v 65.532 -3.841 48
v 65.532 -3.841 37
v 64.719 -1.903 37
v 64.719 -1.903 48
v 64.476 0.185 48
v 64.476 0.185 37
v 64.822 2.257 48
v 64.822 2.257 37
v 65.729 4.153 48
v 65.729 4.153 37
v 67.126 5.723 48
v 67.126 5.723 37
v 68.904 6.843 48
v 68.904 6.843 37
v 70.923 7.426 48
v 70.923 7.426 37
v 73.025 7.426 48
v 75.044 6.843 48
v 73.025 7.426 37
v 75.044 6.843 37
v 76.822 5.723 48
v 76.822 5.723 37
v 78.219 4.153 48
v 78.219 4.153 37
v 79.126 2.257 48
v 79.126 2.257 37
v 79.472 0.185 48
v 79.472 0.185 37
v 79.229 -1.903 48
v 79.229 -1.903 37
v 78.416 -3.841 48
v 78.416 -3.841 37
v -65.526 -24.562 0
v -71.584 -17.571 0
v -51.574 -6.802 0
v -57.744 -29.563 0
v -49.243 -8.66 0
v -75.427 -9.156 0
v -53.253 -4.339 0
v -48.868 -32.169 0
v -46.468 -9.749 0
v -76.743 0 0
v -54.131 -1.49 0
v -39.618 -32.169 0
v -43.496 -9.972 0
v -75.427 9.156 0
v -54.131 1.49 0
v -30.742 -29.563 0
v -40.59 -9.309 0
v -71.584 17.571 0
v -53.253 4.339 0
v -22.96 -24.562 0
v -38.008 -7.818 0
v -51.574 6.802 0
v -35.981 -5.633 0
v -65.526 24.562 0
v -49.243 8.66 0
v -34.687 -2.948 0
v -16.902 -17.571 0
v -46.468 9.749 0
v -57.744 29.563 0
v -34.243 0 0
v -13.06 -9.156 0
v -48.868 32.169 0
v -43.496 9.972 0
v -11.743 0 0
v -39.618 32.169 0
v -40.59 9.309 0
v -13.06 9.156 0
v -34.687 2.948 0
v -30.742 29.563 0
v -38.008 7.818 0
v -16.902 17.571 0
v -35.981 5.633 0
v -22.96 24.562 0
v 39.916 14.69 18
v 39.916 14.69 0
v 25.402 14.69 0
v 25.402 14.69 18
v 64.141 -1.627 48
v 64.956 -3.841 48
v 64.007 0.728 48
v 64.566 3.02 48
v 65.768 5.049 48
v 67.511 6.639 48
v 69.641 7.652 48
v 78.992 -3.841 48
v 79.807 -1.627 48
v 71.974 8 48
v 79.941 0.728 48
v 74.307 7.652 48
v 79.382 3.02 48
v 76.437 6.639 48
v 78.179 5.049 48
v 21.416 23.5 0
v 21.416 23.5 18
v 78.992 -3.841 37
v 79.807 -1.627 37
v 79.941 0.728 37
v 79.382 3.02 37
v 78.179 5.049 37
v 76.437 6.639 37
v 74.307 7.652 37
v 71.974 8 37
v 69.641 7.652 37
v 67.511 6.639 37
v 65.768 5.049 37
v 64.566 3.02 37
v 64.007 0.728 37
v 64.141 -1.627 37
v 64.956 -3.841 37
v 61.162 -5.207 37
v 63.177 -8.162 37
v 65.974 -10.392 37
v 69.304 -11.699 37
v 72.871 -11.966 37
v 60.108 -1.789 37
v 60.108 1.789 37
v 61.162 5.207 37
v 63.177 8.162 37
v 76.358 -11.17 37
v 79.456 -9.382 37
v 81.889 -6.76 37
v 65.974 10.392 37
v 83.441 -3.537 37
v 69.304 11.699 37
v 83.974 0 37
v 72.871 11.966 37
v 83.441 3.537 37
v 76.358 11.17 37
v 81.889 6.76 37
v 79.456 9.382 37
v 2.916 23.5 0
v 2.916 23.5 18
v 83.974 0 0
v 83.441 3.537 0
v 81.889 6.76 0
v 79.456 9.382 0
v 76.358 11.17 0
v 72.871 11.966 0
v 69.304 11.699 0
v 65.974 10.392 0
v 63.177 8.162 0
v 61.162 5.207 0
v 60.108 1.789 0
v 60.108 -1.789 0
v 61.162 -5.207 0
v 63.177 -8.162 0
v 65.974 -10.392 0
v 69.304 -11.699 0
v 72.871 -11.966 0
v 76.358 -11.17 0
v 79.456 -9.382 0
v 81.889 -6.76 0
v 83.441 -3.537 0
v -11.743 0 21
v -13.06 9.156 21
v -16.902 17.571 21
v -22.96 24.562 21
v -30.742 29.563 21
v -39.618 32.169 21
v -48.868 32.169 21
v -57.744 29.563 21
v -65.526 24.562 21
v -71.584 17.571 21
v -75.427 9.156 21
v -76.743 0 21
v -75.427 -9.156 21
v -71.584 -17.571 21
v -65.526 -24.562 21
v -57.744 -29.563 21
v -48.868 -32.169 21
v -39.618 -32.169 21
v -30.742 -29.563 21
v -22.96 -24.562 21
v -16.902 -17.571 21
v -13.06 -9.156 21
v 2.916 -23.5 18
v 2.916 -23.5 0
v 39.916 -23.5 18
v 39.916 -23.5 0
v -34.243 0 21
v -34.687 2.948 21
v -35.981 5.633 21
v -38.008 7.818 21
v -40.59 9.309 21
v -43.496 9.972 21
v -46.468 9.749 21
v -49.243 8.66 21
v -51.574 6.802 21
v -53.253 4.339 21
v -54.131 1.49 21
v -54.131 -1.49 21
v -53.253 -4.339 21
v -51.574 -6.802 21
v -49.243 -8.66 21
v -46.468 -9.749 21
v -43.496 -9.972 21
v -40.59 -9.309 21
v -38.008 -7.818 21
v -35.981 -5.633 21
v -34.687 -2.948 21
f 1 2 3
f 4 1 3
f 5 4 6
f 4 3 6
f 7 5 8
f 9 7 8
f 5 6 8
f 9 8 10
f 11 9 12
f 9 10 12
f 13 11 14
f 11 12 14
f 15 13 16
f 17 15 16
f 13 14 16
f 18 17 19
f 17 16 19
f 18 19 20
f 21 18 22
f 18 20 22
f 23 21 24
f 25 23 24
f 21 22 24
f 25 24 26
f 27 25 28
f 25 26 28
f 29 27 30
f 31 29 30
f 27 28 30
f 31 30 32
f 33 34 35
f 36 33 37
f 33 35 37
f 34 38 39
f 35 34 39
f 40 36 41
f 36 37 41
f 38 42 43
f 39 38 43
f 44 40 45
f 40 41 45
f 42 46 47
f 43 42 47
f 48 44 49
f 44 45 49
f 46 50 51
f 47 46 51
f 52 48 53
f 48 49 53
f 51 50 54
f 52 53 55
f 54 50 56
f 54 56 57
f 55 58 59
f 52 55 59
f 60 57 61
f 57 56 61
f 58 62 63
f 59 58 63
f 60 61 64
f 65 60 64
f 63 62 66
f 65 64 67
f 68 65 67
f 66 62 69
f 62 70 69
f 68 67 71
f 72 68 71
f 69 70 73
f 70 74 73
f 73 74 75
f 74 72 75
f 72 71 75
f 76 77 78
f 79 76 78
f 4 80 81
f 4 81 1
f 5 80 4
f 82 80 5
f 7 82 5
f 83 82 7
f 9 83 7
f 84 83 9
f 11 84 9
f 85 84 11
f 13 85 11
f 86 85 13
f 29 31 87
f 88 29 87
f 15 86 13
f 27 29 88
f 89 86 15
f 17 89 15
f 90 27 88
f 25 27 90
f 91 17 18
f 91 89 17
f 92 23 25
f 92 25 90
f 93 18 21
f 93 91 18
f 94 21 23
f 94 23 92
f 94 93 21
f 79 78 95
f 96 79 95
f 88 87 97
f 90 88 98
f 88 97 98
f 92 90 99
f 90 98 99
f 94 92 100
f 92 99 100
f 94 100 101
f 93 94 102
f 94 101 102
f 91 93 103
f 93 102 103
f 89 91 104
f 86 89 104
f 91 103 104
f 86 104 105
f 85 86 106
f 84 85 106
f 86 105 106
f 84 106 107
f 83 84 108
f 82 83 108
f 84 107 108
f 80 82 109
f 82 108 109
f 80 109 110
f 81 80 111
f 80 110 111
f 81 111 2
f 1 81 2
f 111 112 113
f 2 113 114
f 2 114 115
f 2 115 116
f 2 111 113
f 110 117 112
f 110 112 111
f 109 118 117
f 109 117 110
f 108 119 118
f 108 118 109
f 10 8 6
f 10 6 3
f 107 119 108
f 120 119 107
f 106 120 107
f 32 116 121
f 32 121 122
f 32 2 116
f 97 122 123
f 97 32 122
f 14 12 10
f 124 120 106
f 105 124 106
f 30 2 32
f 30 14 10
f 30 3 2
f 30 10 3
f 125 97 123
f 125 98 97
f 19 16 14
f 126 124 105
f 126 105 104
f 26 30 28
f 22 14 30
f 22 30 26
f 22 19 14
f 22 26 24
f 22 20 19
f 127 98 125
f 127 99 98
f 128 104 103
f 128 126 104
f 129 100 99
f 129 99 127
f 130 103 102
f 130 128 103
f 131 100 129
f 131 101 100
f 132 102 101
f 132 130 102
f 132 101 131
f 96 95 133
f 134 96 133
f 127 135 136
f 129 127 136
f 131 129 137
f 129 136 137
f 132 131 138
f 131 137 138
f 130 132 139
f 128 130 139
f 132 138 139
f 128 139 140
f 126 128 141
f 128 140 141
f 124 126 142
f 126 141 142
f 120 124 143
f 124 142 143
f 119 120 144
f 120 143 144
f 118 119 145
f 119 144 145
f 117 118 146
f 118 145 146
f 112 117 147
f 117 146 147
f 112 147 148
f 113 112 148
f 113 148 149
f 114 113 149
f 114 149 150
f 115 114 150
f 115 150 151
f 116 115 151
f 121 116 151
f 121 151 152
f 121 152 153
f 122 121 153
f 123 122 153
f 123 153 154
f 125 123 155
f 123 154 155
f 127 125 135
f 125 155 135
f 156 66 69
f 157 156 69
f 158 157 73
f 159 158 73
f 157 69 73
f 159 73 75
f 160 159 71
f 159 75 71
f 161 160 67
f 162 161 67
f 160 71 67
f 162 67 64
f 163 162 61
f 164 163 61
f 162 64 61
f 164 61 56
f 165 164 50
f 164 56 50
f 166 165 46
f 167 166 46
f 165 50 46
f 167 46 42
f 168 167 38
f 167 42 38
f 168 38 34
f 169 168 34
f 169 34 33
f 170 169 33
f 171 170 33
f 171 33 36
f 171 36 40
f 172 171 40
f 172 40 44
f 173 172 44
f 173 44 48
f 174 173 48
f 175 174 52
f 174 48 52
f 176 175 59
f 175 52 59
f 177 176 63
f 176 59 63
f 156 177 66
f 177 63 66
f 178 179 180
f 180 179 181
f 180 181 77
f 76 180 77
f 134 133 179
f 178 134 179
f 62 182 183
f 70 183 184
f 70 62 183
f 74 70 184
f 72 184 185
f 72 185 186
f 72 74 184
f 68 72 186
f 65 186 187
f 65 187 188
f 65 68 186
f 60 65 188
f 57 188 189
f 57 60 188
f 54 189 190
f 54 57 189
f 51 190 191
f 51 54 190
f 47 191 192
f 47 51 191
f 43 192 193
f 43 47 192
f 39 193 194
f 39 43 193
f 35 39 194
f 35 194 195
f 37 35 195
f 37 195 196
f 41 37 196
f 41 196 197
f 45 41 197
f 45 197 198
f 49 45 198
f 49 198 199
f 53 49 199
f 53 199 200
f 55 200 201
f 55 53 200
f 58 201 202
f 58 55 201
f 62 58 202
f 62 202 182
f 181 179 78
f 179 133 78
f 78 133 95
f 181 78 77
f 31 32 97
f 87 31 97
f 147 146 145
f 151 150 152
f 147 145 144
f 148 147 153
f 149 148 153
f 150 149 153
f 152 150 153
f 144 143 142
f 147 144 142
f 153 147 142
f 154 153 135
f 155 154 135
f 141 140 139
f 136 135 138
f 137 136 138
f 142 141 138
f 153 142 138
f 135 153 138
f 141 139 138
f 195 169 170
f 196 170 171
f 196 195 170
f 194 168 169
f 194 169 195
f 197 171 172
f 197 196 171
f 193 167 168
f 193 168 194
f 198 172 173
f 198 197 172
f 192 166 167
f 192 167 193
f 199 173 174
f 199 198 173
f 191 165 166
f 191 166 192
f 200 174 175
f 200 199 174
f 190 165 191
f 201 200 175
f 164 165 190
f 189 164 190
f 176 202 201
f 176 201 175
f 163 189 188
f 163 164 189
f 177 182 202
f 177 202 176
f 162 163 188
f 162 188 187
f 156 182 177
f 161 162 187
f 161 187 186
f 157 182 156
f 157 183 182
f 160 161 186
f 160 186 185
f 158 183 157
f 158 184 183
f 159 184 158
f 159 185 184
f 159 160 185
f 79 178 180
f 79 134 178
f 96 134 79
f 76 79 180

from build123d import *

# Parameters (mm, degrees)
F0_R     = 32.5
F0_R_2   = 10
F1_DEPTH = 21
F2_DEPTH = 18
F0_R_3   = 12
F3_DEPTH = 37
F4_DEPTH = 48


with BuildPart() as f1:
    # F0 (on Top) → F1 (new body)
    with BuildSketch(Plane.XY):
        with Locations((-44.243086, 0)):
            Circle(F0_R)
        with Locations((-44.243086, 0)):
            Circle(F0_R_2, mode=Mode.SUBTRACT)
    extrude(amount=F1_DEPTH)


with BuildPart() as f2:
    # F0 (on Top) → F2 (new body)
    with BuildSketch(Plane.XY):
        Polygon((2.915582, -23.5), (39.915582, -23.5), (39.915582, 14.68972), (25.401583, 14.68972), (21.415582, 23.5), (2.915582, 23.5), align=None)
    extrude(amount=F2_DEPTH)


with BuildPart() as f3:
    # F0 (on Top) → F3 (new body)
    with BuildSketch(Plane.XY):
        with Locations((71.97392, 0)):
            Circle(F0_R_3)
        with BuildLine():
            ThreePointArc((64.956249, -3.840872), (71.97392, 8), (78.991591, -3.840872))
            Line((78.991591, -3.840872), (78.415791, -3.840872))
            ThreePointArc((78.415791, -3.840872), (71.97392, 7.5), (65.532049, -3.840872))
            Line((65.532049, -3.840872), (64.956249, -3.840872))
        make_face(mode=Mode.SUBTRACT)
    extrude(amount=F3_DEPTH)

    # F0 (on Top) → F4 (join)
    with BuildSketch(Plane.XY):
        with BuildLine():
            Line((78.415791, -3.840872), (78.991591, -3.840872))
            ThreePointArc((78.991591, -3.840872), (71.97392, 8), (64.956249, -3.840872))
            Line((64.956249, -3.840872), (65.532049, -3.840872))
            ThreePointArc((65.532049, -3.840872), (71.97392, 7.5), (78.415791, -3.840872))
        make_face()
    extrude(amount=F4_DEPTH)


solid = Compound([f1.part, f2.part, f3.part])
